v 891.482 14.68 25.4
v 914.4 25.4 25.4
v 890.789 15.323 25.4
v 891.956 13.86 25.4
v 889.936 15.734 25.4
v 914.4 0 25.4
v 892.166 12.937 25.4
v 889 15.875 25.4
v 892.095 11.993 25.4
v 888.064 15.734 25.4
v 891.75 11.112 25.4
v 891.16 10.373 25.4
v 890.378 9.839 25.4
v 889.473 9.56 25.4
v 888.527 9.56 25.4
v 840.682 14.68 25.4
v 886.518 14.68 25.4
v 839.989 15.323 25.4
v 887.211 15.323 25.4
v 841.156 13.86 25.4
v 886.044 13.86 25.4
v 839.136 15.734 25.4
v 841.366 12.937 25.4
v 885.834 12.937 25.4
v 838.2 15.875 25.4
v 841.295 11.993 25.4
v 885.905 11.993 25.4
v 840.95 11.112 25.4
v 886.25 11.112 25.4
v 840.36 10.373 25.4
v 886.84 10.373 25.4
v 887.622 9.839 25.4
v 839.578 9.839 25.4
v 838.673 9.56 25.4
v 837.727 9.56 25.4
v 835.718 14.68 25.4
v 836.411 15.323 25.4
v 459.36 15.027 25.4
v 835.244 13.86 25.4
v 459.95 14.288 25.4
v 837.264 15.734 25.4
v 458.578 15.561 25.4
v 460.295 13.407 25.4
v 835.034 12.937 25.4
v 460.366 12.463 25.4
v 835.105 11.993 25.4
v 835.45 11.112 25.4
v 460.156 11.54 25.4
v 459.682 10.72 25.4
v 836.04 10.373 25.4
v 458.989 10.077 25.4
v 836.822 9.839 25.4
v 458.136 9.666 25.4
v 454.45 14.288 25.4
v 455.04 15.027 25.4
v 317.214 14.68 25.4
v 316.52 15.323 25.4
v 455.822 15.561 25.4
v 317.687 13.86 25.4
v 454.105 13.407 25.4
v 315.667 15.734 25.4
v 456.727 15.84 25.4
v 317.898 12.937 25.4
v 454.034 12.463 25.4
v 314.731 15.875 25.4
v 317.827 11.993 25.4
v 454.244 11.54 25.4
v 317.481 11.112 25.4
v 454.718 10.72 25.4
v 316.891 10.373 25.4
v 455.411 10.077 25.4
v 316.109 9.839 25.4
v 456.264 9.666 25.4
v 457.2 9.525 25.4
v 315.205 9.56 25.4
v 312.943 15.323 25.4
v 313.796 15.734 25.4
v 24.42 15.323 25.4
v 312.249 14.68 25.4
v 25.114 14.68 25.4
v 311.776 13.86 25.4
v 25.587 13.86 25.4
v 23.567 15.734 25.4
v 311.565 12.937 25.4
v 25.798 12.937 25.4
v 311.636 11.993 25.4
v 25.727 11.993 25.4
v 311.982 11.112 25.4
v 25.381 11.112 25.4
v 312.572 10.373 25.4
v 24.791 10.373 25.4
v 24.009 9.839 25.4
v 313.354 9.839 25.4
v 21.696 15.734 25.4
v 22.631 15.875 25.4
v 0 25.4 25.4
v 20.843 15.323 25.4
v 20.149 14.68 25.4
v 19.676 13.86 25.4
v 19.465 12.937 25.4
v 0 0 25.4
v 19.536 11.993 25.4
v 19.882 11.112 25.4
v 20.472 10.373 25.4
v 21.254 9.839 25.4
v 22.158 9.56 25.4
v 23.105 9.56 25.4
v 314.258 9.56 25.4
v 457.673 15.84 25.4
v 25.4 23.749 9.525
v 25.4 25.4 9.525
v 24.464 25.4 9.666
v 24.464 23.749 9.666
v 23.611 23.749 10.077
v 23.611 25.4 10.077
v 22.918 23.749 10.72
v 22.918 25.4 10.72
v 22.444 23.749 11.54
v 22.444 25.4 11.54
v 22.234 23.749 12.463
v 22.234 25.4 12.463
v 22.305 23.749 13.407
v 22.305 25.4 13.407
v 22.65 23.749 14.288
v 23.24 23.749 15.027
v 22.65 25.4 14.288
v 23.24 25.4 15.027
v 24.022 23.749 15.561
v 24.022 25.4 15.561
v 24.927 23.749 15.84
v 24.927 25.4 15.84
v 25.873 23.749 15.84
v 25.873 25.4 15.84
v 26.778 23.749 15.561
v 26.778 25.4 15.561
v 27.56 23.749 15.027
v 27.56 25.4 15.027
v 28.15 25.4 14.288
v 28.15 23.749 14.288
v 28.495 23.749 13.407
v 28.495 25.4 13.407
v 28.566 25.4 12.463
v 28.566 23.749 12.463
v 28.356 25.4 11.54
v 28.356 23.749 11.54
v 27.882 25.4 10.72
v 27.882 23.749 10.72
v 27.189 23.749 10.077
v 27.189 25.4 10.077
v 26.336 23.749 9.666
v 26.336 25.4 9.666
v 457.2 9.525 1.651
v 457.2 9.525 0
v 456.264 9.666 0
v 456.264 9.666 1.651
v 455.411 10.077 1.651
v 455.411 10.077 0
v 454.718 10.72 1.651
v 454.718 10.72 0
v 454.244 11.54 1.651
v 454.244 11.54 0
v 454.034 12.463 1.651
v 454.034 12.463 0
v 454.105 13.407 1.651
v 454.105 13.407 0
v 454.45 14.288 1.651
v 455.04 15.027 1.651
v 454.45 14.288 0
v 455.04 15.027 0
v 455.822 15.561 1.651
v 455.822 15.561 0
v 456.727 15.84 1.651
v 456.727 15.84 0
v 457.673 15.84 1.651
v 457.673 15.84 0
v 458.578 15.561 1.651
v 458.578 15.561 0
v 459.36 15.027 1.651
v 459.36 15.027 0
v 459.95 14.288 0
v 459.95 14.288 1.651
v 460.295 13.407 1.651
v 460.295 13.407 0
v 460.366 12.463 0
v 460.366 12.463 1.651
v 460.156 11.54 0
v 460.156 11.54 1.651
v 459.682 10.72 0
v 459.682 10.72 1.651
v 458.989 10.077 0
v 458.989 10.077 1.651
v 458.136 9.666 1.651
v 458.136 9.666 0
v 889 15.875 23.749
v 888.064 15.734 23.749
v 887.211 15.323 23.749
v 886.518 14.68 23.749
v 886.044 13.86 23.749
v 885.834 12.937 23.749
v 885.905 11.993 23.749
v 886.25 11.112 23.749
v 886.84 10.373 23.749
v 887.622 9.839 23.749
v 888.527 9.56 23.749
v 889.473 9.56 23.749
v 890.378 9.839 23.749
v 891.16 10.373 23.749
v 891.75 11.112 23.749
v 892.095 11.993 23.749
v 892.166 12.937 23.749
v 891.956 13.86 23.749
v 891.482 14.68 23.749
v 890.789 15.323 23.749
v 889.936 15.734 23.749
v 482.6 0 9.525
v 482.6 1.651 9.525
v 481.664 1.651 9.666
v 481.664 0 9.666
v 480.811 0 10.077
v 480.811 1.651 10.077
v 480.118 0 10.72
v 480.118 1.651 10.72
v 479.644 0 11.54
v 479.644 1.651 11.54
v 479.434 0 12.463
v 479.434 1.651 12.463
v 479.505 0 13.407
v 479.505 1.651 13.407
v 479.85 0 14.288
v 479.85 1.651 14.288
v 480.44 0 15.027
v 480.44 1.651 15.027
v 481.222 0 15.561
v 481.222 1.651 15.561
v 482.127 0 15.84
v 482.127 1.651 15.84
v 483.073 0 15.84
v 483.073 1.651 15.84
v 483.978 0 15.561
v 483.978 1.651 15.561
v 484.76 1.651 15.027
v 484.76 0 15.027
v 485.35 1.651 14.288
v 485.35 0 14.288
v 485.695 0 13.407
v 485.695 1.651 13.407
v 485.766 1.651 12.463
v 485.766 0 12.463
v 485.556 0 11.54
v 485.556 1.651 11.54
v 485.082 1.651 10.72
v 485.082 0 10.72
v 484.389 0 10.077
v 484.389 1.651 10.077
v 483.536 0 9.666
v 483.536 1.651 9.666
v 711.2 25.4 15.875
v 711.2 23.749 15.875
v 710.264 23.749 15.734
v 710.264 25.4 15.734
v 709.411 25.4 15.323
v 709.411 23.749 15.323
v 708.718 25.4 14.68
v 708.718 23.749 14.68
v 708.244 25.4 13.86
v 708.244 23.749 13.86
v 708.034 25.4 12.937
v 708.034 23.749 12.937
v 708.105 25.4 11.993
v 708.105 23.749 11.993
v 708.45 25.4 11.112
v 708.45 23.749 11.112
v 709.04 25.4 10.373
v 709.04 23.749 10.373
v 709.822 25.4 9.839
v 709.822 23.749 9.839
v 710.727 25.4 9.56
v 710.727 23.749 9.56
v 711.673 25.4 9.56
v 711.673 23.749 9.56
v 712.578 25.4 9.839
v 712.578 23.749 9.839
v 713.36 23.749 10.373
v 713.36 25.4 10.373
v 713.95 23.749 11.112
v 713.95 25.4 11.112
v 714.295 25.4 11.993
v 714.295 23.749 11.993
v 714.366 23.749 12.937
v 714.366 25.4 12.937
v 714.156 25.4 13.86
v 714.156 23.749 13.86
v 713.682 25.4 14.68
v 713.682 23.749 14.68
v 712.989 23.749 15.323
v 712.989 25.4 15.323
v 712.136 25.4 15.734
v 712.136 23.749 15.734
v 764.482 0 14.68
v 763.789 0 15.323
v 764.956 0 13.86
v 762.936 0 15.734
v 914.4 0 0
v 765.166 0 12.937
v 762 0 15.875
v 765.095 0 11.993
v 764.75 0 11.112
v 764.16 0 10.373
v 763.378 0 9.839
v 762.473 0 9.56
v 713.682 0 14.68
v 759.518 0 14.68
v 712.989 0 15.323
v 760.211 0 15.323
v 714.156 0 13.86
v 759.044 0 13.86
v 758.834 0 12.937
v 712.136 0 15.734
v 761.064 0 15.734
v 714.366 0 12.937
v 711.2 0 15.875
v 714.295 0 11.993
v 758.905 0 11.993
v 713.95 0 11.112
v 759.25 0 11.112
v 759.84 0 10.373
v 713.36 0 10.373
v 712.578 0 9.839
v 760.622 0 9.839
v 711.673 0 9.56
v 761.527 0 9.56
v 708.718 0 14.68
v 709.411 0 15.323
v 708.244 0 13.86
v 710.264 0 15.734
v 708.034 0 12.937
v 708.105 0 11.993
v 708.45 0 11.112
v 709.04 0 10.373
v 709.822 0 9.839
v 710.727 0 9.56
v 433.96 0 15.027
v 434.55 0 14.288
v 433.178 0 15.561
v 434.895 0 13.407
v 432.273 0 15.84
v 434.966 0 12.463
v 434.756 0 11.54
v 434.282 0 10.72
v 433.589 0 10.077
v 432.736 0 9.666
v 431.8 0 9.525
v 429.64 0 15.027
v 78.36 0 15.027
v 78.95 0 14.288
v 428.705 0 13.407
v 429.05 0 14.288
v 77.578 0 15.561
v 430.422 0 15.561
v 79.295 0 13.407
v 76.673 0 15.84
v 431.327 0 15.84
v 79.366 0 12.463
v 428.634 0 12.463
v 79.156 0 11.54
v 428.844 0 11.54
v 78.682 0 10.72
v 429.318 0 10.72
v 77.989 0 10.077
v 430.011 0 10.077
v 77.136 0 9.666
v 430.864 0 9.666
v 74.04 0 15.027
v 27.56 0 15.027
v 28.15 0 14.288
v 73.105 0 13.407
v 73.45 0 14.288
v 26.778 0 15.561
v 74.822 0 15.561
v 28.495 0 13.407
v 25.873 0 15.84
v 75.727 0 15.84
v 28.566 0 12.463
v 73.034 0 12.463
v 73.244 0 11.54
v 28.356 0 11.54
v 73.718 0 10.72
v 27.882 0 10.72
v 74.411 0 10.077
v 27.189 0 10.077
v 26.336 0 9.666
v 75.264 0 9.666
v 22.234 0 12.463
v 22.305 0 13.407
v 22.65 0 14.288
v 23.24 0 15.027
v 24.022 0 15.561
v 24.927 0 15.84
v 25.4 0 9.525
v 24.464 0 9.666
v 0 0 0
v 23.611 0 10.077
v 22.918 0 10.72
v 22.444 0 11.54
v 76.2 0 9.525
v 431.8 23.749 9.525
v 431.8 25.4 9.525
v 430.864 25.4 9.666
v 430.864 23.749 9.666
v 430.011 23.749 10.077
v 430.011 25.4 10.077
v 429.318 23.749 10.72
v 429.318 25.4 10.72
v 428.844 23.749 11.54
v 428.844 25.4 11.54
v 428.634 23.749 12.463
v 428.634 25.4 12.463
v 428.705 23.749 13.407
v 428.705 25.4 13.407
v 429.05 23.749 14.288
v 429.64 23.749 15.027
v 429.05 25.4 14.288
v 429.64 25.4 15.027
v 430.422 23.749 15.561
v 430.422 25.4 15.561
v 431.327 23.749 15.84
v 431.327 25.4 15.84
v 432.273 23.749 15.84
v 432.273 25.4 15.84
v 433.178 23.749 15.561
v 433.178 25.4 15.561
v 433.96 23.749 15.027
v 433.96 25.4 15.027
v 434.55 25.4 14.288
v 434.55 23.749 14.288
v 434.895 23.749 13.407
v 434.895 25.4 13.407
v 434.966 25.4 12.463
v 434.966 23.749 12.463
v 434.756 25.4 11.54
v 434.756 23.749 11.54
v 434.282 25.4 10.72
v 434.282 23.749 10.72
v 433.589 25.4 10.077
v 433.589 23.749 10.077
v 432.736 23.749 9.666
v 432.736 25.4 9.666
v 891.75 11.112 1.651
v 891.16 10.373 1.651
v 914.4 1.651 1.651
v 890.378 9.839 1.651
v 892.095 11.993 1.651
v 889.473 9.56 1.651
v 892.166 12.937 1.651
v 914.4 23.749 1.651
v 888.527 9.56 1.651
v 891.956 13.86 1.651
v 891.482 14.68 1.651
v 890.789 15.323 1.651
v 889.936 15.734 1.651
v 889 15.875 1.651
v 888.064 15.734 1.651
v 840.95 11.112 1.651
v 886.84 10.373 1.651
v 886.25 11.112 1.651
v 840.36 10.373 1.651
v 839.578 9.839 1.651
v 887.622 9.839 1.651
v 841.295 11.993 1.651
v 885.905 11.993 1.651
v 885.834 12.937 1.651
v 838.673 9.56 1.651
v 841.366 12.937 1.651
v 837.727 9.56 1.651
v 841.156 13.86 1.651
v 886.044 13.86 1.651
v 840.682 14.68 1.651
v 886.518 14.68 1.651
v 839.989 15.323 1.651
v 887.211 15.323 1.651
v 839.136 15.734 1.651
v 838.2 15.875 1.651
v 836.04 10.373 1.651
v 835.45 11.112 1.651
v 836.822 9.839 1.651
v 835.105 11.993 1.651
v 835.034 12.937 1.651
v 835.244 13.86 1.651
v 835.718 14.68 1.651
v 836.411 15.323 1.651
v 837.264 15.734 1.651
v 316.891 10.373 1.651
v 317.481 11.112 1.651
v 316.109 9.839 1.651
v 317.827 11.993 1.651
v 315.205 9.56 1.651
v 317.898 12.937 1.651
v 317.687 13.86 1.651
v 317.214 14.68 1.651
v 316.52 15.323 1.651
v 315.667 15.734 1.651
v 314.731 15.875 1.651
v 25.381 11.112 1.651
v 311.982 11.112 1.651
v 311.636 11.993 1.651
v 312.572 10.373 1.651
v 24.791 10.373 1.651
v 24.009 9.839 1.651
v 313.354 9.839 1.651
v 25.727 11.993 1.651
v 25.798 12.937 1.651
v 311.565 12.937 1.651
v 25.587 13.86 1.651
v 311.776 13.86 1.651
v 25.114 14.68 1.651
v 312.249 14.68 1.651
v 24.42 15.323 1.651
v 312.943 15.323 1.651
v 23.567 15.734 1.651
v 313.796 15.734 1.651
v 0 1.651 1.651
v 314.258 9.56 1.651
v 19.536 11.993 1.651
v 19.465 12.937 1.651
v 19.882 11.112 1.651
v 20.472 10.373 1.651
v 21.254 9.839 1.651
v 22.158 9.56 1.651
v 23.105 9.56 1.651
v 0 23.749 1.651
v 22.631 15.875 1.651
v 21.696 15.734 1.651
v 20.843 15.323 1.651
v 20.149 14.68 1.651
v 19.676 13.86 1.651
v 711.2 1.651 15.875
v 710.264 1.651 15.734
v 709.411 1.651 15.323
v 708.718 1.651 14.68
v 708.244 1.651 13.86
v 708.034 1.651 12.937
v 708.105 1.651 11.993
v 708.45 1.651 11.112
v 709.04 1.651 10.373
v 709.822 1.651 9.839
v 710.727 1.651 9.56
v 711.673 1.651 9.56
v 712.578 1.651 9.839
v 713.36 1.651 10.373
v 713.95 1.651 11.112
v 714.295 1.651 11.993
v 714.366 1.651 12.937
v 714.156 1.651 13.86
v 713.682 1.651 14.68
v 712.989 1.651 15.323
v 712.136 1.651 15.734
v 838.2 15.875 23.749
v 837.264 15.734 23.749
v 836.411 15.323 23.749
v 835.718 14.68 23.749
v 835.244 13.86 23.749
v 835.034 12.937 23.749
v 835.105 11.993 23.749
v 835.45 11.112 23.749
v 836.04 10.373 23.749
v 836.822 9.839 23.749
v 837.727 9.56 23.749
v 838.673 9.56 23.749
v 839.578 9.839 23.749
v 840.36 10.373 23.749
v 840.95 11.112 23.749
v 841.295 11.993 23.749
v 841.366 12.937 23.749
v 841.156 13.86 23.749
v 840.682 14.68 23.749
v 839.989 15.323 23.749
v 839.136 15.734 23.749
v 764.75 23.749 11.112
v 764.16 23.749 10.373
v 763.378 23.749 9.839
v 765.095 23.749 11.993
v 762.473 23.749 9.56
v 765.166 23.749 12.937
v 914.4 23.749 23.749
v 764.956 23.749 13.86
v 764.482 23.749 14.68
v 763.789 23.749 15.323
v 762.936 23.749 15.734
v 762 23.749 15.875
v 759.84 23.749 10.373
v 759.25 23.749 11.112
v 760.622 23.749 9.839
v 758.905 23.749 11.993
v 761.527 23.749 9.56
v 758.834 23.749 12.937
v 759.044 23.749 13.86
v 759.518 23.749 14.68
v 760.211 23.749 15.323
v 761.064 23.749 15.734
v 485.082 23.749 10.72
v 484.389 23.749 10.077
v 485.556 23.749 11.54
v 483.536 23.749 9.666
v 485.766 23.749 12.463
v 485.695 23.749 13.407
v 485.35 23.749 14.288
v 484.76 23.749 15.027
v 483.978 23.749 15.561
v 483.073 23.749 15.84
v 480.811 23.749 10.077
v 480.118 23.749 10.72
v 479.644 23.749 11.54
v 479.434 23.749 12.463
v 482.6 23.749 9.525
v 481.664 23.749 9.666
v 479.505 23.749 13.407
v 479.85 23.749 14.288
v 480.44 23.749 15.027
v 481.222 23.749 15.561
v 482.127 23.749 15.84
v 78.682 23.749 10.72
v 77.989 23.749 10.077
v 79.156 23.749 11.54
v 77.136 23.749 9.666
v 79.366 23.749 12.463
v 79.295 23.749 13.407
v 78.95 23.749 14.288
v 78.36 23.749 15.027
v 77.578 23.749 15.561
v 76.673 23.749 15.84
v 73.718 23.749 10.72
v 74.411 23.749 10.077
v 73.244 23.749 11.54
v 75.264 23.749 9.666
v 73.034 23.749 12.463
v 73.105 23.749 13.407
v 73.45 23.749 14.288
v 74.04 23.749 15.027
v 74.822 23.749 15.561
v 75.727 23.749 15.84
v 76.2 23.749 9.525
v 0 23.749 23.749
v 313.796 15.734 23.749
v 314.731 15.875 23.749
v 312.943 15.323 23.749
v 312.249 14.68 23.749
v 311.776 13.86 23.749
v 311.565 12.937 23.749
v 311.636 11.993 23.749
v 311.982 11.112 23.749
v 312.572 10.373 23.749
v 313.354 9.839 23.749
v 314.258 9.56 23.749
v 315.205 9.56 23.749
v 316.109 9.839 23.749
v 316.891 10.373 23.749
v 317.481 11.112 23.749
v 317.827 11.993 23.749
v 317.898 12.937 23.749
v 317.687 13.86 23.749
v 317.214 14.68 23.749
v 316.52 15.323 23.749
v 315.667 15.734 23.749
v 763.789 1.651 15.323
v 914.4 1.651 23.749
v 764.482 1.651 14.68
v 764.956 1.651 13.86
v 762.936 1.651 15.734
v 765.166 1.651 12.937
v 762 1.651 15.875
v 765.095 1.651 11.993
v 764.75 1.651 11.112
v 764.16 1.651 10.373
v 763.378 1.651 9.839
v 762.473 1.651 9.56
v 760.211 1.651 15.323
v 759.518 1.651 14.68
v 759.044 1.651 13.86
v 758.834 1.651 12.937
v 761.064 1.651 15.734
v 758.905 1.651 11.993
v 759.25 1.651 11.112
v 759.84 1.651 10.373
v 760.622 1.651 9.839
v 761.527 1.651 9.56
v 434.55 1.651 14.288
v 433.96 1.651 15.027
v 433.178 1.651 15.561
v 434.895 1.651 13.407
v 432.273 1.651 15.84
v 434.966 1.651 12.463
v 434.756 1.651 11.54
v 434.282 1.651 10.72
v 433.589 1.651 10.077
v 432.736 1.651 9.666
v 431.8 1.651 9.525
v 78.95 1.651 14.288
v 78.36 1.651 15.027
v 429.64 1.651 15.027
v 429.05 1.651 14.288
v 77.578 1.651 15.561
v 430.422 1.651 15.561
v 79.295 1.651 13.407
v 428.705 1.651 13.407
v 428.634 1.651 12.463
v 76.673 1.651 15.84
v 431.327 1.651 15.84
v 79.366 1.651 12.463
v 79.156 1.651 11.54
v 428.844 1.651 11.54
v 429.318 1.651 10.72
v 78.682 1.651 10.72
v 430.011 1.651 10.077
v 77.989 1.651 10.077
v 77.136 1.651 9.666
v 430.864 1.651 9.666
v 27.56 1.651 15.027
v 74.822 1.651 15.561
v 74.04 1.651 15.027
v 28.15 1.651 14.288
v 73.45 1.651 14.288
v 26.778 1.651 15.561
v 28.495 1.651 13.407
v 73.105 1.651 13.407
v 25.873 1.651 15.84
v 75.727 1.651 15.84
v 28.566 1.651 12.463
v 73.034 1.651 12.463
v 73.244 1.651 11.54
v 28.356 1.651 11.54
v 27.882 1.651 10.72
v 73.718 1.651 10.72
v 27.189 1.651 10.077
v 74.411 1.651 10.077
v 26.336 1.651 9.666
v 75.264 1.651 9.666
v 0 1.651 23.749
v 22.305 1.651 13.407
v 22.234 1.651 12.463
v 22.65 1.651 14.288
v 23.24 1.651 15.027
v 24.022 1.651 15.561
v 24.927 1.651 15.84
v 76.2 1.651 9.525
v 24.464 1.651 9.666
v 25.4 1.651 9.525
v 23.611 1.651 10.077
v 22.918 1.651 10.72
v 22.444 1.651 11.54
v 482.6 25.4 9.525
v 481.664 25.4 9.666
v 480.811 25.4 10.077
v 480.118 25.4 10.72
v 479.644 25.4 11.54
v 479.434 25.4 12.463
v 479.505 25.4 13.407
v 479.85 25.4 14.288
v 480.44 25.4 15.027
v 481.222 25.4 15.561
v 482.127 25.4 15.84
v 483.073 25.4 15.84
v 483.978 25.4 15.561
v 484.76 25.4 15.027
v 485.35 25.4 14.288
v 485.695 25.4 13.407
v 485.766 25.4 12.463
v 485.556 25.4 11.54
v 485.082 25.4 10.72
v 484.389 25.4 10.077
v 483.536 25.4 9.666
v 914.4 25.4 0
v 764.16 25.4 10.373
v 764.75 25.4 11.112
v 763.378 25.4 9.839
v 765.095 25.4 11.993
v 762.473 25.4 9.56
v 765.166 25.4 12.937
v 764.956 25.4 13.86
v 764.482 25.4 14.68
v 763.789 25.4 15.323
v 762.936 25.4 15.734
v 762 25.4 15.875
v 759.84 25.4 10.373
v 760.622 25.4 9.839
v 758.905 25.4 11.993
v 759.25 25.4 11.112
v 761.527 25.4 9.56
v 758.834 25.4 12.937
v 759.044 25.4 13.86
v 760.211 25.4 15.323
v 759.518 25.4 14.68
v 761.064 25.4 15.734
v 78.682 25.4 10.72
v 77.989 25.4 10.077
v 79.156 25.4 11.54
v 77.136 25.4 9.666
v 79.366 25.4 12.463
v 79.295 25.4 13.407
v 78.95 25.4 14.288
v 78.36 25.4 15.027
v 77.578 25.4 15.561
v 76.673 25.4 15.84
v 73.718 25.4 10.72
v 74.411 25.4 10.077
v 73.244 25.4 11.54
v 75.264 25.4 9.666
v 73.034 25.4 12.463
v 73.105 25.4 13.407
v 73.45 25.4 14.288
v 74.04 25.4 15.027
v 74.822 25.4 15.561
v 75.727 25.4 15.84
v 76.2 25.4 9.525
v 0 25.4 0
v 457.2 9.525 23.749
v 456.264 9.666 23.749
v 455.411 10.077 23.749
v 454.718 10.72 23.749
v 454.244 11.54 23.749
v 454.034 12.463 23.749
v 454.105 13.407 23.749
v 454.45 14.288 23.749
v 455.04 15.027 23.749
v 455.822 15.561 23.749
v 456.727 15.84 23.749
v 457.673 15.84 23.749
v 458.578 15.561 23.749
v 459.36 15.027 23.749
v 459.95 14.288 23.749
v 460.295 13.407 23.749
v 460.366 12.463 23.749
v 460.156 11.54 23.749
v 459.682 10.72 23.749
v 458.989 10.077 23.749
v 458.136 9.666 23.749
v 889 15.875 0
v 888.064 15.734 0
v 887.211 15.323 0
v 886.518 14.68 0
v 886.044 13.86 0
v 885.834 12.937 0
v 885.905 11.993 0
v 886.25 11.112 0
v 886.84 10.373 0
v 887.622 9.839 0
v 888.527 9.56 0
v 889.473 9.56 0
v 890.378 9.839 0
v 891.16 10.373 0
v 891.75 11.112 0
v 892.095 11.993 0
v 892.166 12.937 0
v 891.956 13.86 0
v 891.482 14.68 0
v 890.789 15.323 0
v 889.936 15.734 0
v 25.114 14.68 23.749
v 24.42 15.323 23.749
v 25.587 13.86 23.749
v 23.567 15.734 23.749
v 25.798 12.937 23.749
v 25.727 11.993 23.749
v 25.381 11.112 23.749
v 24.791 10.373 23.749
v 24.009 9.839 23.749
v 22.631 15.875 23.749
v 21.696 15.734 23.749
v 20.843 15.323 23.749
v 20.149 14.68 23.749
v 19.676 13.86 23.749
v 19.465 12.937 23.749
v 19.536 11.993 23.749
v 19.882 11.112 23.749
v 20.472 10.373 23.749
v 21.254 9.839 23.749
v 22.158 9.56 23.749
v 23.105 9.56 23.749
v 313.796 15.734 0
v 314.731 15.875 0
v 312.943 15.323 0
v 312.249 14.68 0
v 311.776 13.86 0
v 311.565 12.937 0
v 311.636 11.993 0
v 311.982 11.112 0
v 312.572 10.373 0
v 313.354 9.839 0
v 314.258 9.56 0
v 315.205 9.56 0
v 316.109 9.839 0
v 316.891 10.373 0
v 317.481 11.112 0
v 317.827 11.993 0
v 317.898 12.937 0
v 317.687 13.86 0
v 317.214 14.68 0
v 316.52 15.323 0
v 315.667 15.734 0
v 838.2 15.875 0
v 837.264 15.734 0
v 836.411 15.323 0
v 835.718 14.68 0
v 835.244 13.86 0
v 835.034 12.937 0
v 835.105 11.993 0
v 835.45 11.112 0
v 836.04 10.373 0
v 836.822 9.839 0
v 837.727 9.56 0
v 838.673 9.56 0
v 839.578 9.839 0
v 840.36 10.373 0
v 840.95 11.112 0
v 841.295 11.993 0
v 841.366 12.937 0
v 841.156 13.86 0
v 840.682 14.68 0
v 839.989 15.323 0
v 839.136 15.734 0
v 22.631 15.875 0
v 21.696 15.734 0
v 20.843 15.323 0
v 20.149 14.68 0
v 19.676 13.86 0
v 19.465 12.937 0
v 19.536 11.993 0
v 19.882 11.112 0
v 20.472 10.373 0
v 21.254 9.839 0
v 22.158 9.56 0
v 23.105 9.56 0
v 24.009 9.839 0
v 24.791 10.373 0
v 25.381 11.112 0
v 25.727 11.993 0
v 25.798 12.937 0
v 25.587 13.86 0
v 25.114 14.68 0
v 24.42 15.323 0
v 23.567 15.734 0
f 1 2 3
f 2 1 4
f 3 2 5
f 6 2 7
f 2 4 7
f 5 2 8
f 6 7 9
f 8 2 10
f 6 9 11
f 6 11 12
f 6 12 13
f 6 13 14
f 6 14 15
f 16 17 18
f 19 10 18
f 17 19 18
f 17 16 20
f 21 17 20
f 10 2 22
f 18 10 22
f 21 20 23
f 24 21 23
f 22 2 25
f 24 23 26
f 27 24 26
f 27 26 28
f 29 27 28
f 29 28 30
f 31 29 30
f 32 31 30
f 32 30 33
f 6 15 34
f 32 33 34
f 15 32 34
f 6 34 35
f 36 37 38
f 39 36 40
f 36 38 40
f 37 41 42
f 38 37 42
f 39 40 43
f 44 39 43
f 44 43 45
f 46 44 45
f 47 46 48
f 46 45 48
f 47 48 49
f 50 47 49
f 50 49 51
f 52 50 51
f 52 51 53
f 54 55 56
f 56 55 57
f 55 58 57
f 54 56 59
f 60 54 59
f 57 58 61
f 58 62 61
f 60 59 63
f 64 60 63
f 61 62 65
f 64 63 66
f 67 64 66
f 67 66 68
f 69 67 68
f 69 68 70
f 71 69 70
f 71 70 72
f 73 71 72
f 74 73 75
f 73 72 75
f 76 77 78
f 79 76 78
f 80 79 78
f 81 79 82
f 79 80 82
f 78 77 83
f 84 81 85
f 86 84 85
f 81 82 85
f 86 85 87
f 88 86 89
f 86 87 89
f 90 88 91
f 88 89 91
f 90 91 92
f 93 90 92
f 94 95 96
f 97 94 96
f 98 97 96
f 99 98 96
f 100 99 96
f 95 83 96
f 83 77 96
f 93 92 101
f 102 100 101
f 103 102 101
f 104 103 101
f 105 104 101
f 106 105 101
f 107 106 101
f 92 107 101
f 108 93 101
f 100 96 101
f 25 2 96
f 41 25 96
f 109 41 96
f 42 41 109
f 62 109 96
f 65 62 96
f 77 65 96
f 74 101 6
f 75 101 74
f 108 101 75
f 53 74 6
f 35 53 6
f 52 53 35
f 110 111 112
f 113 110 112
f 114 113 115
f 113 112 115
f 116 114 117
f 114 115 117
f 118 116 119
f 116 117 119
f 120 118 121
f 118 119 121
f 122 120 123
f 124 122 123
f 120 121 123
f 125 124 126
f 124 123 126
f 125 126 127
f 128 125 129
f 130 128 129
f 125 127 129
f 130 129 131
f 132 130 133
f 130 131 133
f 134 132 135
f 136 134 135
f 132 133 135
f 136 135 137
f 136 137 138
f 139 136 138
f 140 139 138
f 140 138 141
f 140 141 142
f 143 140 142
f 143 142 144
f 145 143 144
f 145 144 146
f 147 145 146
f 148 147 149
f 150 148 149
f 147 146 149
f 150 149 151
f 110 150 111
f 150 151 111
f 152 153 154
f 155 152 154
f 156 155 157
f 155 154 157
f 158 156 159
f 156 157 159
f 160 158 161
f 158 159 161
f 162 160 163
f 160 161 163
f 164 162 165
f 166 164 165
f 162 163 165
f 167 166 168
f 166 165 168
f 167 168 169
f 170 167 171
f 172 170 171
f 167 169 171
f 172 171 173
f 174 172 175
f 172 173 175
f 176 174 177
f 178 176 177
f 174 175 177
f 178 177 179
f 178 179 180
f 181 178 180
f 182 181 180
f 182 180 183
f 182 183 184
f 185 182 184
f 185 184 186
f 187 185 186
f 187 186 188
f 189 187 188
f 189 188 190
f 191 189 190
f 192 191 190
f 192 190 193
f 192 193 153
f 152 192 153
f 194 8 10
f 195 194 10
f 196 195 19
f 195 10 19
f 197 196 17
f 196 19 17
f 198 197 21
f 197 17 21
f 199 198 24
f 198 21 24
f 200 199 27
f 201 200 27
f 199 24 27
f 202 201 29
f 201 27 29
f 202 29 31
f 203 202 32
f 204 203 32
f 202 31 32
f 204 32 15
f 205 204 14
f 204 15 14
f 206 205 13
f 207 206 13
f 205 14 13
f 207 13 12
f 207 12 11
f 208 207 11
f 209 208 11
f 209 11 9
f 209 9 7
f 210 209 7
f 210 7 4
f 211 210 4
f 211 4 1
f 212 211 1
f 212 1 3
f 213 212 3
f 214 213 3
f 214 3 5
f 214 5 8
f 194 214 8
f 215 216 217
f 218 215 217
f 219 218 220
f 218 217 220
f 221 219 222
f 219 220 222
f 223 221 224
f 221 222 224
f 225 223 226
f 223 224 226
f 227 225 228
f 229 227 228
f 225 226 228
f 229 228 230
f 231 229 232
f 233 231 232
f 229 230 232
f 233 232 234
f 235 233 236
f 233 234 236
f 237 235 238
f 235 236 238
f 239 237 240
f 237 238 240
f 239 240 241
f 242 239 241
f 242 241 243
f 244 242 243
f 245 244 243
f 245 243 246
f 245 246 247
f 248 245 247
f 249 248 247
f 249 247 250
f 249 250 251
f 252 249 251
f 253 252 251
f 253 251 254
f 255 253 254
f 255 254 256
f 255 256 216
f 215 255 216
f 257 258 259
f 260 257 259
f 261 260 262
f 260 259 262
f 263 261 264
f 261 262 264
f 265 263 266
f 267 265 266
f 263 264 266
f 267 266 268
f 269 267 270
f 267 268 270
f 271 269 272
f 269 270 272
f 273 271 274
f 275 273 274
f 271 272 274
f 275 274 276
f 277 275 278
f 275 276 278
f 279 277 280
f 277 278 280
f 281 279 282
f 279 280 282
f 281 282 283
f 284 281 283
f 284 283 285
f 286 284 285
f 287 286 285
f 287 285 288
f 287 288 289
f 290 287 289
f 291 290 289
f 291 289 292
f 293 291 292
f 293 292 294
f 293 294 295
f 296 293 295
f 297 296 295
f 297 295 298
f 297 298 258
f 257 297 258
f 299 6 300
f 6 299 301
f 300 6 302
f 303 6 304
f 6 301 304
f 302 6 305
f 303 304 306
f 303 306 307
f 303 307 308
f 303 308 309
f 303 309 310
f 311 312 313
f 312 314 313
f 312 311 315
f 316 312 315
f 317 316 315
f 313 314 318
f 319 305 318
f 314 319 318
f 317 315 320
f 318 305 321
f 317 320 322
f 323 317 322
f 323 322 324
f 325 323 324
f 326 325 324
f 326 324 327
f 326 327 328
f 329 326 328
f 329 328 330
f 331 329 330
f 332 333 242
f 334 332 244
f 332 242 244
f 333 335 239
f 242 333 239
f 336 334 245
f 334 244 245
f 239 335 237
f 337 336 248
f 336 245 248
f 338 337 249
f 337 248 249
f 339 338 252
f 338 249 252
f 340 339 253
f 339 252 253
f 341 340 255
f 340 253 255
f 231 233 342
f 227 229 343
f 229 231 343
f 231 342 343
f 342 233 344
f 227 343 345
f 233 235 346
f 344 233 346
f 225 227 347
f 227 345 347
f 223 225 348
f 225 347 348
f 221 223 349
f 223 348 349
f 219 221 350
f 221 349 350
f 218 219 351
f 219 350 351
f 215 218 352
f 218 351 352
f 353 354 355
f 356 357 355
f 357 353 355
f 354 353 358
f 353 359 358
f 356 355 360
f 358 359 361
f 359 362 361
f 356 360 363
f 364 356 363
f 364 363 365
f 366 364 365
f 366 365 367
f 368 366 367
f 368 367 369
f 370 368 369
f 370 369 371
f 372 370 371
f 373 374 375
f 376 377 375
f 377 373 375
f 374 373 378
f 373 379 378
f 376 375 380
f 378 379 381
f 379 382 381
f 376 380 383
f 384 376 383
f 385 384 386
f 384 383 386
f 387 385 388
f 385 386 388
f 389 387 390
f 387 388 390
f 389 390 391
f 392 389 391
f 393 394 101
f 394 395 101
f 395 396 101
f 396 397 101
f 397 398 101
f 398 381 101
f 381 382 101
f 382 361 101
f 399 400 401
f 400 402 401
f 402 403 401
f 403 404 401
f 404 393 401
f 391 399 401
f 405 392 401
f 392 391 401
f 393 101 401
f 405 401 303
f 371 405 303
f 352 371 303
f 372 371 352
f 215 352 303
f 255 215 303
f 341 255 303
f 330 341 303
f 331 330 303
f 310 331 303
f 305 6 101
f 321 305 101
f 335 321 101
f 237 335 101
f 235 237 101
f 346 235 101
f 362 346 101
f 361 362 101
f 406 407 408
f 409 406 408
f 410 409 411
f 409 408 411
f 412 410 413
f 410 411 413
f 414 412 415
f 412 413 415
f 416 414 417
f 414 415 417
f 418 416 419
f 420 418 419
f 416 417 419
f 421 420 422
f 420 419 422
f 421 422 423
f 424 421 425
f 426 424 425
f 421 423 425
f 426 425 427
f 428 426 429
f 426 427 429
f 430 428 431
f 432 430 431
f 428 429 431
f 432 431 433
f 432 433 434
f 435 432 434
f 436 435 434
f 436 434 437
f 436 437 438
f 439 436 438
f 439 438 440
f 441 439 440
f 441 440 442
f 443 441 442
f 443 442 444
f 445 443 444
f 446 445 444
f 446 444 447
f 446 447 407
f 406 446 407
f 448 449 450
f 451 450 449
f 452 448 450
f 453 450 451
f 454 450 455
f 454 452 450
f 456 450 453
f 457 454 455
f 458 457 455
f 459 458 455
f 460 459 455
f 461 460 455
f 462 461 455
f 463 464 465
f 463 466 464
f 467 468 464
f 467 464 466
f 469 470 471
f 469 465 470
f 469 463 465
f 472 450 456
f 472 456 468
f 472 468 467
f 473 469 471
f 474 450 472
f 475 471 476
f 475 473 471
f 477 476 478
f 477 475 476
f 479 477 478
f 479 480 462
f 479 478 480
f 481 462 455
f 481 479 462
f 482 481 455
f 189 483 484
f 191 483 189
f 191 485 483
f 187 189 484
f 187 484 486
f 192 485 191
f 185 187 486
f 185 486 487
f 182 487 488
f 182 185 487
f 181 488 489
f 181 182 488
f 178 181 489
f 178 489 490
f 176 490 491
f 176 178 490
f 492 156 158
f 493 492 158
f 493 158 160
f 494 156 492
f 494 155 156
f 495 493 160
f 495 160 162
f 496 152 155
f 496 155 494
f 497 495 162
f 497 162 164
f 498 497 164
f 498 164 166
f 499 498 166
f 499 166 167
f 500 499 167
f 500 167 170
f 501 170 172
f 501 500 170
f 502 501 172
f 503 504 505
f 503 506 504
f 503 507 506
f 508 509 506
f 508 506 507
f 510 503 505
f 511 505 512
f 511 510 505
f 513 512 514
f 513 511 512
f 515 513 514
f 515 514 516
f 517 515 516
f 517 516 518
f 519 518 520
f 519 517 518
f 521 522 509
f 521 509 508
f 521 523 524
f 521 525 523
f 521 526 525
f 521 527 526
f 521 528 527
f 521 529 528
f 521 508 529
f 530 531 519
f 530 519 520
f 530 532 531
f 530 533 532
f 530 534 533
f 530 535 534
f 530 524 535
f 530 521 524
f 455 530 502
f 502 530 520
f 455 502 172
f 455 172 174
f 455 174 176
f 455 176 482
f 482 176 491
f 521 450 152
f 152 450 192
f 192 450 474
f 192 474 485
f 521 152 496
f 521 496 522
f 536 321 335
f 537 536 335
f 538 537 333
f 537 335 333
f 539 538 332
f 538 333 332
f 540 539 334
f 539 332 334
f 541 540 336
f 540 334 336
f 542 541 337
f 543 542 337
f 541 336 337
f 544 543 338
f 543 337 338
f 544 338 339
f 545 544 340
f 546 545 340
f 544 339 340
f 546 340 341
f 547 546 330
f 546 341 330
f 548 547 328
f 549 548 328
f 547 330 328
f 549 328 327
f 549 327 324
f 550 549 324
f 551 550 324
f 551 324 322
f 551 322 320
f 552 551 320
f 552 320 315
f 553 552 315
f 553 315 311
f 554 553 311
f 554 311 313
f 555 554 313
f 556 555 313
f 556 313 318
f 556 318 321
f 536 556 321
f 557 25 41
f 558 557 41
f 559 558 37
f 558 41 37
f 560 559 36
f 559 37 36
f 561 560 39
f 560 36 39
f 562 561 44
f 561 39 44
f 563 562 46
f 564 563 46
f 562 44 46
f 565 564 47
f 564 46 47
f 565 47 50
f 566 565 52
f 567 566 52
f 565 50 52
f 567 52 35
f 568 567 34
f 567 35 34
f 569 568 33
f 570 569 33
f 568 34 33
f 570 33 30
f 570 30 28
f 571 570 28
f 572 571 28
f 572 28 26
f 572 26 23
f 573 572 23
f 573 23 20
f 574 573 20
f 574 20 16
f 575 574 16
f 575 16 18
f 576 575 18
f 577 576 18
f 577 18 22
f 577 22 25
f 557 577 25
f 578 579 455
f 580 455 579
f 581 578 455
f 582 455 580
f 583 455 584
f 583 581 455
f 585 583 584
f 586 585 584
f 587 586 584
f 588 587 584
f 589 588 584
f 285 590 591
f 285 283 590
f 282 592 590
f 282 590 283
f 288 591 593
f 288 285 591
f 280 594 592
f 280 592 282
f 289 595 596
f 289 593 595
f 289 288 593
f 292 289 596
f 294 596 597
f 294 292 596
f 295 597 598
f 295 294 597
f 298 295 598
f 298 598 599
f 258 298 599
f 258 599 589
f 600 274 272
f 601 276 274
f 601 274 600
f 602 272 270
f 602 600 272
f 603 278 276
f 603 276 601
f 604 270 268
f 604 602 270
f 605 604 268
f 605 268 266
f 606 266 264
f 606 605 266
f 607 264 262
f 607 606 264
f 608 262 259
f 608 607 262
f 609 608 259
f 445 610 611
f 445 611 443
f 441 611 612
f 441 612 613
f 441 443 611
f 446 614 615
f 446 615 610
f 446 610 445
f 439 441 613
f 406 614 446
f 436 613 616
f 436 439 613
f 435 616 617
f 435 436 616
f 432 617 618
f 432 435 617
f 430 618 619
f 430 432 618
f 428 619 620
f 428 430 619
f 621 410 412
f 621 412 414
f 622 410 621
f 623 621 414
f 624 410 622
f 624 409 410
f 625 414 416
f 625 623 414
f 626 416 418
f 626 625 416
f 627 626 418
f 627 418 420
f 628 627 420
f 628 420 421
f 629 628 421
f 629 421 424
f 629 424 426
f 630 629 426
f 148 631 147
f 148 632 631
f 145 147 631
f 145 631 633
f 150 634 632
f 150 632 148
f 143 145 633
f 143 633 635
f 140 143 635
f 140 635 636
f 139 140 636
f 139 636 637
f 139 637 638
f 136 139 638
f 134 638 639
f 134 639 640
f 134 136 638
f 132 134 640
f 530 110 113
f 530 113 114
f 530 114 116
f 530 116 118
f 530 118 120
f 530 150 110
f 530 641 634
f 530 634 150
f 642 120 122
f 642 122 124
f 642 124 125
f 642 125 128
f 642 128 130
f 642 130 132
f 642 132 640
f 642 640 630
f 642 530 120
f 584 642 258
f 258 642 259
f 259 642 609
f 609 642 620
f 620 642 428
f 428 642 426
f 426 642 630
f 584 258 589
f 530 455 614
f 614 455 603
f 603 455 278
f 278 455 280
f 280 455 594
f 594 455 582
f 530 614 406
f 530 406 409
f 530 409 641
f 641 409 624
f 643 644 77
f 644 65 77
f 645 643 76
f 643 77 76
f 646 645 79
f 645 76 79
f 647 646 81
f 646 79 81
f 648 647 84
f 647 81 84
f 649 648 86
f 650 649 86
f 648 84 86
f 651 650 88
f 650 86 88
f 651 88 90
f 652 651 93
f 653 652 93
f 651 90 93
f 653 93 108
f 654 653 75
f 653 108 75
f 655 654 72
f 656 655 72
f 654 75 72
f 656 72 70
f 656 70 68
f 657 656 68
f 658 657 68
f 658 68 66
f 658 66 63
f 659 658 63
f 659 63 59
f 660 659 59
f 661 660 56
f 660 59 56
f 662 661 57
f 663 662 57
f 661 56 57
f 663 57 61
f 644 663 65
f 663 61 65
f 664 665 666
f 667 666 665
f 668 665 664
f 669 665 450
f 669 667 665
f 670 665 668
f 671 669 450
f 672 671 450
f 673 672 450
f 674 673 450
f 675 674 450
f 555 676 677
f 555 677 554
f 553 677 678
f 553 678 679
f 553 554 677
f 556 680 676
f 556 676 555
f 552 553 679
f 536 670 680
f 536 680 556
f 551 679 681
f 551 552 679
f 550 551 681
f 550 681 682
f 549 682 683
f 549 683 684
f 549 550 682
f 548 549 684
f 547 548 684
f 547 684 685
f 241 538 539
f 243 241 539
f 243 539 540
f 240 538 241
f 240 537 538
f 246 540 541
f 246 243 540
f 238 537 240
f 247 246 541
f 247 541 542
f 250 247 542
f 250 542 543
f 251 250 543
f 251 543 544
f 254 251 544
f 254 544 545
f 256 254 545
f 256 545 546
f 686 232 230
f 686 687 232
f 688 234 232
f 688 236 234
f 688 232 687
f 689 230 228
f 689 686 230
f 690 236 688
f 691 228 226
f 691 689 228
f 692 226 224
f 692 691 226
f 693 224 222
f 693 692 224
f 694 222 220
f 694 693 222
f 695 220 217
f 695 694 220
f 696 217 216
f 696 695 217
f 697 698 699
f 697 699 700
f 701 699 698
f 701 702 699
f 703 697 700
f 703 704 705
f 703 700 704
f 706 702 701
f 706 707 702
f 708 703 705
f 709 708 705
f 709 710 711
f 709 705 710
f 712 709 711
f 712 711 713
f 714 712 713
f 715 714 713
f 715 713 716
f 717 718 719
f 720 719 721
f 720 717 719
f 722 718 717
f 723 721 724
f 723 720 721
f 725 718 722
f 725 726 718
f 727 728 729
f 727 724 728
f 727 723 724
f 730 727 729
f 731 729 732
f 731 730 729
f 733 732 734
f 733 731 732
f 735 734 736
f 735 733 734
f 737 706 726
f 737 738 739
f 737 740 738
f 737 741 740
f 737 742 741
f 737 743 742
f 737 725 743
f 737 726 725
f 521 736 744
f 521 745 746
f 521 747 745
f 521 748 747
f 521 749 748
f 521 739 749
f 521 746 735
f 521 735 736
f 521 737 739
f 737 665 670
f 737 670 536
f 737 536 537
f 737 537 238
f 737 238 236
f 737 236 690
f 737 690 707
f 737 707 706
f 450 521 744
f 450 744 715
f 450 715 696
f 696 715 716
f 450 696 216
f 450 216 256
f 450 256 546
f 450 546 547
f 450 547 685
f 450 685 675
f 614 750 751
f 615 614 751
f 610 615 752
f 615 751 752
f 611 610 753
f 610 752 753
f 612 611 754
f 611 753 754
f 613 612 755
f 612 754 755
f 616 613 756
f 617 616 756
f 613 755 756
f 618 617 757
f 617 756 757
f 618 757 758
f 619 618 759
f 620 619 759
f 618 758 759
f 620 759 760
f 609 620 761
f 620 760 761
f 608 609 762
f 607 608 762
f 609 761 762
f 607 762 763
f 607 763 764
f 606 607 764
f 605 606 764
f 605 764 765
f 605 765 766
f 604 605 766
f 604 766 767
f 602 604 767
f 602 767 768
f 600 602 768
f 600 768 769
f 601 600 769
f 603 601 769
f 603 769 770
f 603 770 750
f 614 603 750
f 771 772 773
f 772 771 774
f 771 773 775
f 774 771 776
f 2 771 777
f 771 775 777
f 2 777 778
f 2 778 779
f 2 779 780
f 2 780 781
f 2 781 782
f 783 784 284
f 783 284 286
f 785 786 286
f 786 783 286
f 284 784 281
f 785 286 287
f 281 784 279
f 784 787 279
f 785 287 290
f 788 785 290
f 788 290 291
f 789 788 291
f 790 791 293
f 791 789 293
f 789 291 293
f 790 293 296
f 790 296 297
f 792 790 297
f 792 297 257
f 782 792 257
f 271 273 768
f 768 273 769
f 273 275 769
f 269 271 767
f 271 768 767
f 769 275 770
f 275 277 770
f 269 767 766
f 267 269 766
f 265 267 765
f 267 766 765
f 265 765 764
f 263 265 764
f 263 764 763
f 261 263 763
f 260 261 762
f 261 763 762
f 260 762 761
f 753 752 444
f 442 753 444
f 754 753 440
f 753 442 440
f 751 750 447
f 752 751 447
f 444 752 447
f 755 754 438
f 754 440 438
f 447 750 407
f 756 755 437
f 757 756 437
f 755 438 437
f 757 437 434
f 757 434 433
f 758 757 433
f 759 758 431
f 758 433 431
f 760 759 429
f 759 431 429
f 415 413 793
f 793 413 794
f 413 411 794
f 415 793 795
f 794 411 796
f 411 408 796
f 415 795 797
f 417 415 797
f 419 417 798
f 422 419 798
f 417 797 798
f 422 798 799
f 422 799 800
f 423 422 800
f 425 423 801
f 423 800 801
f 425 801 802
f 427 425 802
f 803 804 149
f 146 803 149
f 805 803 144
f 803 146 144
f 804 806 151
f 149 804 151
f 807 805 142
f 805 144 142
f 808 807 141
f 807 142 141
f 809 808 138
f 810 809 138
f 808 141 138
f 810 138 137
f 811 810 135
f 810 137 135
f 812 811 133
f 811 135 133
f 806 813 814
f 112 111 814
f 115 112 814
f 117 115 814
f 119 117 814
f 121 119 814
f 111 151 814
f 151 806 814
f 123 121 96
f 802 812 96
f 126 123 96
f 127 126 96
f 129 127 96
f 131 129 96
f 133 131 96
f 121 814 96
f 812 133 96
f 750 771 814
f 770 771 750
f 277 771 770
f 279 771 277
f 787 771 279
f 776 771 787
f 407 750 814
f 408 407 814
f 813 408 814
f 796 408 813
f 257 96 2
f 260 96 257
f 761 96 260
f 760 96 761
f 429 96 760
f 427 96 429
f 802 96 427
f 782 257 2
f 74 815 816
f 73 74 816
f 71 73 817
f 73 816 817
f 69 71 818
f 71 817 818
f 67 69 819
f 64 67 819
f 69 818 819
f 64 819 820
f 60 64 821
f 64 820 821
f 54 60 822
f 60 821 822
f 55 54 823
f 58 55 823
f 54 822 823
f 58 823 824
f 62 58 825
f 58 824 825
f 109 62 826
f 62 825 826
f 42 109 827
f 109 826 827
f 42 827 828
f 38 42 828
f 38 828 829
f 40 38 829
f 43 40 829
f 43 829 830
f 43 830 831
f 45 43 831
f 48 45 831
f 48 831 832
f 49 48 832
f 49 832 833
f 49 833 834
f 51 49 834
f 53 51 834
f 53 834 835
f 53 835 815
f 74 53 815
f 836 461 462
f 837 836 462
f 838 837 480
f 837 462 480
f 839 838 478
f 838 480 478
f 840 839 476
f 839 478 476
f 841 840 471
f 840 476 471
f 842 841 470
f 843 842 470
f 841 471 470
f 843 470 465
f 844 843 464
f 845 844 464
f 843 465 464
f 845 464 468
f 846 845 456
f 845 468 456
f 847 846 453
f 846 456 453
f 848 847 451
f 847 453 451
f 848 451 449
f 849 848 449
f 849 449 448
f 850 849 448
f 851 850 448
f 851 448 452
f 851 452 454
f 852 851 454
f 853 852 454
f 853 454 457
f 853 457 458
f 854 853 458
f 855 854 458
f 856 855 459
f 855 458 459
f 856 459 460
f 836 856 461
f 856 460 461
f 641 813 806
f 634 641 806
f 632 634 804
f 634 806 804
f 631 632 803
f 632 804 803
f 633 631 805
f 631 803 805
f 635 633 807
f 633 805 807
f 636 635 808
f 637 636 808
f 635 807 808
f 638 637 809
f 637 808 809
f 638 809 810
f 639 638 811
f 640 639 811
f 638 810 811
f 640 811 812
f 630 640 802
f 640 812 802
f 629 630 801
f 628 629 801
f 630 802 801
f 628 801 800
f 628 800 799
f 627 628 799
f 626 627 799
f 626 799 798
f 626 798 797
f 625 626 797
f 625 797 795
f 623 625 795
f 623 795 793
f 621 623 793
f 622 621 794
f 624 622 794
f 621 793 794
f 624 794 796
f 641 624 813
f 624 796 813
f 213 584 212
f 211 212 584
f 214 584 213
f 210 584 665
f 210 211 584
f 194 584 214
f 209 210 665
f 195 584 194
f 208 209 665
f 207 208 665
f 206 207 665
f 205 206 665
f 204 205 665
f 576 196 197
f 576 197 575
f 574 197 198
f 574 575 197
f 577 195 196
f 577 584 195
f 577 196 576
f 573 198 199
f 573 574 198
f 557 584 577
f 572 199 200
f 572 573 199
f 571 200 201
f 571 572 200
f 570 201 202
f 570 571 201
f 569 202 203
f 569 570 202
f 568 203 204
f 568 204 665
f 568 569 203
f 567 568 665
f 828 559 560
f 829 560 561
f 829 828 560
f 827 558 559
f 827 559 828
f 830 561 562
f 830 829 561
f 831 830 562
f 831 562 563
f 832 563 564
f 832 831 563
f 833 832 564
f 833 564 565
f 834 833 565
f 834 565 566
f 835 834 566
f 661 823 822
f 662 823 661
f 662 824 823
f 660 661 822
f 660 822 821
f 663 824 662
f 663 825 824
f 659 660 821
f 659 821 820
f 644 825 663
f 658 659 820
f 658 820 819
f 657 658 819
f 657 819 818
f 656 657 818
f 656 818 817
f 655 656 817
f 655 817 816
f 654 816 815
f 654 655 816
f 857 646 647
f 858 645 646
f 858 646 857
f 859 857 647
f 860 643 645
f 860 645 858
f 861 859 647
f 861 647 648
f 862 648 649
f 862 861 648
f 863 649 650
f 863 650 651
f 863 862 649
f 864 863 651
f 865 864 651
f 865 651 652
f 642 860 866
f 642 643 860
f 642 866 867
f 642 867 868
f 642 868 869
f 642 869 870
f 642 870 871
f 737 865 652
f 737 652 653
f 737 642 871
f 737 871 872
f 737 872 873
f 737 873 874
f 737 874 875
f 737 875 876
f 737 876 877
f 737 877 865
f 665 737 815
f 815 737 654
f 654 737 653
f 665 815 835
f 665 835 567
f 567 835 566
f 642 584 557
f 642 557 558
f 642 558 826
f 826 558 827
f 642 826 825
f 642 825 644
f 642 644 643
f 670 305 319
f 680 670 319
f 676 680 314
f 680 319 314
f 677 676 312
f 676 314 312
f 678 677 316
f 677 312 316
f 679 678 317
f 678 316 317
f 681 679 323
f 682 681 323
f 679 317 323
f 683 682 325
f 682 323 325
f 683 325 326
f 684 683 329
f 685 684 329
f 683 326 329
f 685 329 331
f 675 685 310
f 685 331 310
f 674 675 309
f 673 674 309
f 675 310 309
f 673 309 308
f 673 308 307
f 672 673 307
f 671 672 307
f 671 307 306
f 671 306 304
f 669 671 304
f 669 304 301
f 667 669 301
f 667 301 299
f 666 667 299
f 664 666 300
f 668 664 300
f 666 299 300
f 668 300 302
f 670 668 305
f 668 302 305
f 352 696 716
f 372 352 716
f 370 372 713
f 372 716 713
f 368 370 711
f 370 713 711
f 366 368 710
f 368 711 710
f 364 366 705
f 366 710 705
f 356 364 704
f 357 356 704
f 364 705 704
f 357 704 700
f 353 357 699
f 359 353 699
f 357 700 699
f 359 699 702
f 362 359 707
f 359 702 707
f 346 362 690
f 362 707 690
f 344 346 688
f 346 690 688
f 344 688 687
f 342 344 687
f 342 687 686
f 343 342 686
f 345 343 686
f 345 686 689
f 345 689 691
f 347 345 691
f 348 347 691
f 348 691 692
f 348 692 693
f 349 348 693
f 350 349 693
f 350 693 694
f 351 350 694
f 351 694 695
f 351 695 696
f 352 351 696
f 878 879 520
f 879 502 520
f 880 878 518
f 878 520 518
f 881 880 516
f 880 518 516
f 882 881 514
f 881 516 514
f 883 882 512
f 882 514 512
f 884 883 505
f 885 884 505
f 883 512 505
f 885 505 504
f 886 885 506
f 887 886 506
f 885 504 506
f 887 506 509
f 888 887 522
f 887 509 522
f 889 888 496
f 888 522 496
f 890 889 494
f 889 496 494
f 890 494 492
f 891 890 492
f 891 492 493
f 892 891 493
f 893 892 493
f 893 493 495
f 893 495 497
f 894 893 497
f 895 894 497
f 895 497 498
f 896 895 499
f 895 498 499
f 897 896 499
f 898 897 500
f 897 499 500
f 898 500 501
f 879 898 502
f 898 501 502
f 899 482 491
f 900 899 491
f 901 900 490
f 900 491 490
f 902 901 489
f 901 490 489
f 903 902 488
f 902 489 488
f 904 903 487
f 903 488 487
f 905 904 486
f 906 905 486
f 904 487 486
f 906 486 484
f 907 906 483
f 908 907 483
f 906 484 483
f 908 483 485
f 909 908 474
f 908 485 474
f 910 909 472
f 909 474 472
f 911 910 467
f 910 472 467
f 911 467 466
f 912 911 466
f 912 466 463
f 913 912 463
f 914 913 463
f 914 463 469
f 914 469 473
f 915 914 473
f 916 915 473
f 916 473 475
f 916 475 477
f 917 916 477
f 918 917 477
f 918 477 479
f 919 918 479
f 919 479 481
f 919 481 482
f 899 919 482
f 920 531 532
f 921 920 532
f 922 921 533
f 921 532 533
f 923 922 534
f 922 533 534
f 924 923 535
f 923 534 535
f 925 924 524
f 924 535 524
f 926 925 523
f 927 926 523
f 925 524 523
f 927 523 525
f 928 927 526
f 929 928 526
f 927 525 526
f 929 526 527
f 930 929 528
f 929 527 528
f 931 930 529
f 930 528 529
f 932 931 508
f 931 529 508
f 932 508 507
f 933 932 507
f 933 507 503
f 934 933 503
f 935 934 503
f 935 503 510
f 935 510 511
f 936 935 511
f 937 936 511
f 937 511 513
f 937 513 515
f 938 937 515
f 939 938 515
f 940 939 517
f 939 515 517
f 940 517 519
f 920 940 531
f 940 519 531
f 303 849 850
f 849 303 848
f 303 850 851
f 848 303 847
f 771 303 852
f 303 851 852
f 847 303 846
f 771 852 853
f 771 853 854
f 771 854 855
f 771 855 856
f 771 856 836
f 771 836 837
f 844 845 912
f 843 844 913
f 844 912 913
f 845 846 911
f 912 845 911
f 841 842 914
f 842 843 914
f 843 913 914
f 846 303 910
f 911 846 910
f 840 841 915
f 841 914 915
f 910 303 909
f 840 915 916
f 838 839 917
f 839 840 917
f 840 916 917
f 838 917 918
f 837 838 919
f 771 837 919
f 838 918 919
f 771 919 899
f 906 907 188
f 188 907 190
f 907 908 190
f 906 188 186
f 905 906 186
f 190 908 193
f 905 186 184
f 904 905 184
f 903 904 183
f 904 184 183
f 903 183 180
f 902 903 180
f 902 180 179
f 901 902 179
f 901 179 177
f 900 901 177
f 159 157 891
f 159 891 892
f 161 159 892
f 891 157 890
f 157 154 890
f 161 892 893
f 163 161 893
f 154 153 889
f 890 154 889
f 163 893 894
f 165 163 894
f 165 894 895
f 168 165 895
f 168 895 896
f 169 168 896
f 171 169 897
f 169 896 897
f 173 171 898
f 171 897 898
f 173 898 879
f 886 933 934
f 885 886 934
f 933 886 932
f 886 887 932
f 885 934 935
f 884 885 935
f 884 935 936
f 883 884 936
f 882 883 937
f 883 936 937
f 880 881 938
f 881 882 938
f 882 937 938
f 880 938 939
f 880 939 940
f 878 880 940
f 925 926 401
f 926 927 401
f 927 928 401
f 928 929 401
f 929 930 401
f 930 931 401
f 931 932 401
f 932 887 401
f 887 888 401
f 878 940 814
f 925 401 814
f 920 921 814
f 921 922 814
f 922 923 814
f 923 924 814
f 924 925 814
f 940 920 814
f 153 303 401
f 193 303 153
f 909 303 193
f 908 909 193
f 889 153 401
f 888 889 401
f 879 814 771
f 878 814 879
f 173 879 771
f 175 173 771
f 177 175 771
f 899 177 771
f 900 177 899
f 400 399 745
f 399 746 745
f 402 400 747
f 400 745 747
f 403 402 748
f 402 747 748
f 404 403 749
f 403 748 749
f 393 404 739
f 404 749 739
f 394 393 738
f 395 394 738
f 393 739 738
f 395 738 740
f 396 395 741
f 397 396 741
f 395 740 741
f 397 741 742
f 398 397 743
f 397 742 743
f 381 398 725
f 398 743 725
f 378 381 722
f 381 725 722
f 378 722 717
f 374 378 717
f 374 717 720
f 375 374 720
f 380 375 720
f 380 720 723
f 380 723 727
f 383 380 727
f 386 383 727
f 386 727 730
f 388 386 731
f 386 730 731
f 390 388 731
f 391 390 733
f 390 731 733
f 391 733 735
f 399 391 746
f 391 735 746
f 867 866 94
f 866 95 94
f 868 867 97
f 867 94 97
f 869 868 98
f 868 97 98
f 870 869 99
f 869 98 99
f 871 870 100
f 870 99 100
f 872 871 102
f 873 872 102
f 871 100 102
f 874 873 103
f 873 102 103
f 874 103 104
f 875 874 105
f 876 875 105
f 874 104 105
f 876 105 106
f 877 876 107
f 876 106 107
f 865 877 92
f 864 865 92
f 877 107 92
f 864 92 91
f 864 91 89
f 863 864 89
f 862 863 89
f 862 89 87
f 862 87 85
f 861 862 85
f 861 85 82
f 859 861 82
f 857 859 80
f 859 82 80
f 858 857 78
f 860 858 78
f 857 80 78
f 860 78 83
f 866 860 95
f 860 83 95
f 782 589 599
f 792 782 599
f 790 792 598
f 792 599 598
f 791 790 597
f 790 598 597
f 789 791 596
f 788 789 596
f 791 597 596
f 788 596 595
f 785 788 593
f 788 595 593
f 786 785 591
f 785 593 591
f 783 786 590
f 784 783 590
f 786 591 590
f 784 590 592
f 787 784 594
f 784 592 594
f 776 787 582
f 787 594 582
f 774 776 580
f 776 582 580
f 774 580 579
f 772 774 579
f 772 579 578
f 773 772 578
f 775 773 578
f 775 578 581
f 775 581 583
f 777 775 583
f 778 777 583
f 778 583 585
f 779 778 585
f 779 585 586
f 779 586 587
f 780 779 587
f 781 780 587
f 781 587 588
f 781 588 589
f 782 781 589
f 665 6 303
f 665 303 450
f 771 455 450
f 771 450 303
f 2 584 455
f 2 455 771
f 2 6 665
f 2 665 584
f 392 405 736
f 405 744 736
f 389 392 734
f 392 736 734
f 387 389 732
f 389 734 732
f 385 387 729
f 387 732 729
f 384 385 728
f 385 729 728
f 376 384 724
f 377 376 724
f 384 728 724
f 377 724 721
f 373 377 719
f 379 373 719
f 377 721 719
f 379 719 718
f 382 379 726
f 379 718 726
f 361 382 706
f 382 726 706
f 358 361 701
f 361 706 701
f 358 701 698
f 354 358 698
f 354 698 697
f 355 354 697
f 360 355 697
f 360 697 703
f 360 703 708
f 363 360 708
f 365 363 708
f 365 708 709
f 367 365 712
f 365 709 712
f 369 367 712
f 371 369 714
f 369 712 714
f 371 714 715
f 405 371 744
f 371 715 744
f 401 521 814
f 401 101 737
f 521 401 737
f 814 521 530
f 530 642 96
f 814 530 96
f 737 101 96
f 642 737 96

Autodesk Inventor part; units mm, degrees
ref_plane "YZ Plane" through (0, 0, 0) normal (1, 0, 0) x (0, 1, 0)
ref_plane "XZ Plane" through (0, 0, 0) normal (0, 1, 0) x (-1, 0, 0)
ref_plane "XY Plane" through (0, 0, 0) normal (0, 0, 1) x (1, 0, 0)
sketch "Sketch1" plane through (0, 0, 0) normal (1, 0, 0) x (0, 1, 0)
  line L0 (0, 0) -> (25.4, 0)
  line L1 (25.4, 0) -> (25.4, 25.4)
  line L2 (25.4, 25.4) -> (0, 25.4)
  line L3 (0, 25.4) -> (0, 0)
  line L4 (1.651, 1.651) -> (23.749, 1.651)
  line L5 (23.749, 1.651) -> (23.749, 23.749)
  line L6 (23.749, 23.749) -> (1.651, 23.749)
  line L7 (1.651, 23.749) -> (1.651, 1.651)
  dimension "d0" = 25.4
  dimension "d2" = 25.4
  dimension "d3" = 1.651
  dimension "d4" = 1.651
  dimension "d5" = 1.651
  dimension "d6" = 1.651
extrude "Extrusion1" add sketch "Sketch1" along normal blind 914.4
sketch "Sketch3" plane through (0, 0, 0) normal (0, 0, -1) x (-1, 0, 0)
  line L0 (0, 25.4) -> (-914.4, 25.4) projected
  line L1 (-914.4, 0) -> (-914.4, 25.4) projected
  line L2 (0, 0) -> (-914.4, 0) projected
  point P0 (-889, 12.7)
  point P1 (-838.2, 12.7)
  dimension "d9" = 12.7
  dimension "d10" = 25.4
  dimension "d11" = 12.7
  dimension "d12" = 50.8
hole "Hole1" at (889, 12.7, 0) at (838.2, 12.7, 0) direction (0, 0, 1) diameter 6.35 end through all
sketch "Sketch4" plane through (0, 25.4, 25.4) normal (0, 1, 0) x (1, 0, 0)
  line L0 (0, 0) -> (914.4, 0) projected
  line L1 (914.4, 25.4) -> (914.4, 0) projected
  line L2 (0, 25.4) -> (914.4, 25.4) projected
  line L3 (736.6, 25.4) -> (736.6, 0)
  point P0 (711.2, 12.7)
  point P1 (762, 12.7)
  dimension "d21" = 50.8
  dimension "d23" = 12.7
  dimension "d24" = 12.7
  dimension "d25" = 177.8
  dimension "d26" = 25.4
hole "Hole2" at (711.2, 25.4, 12.7) at (762, 25.4, 12.7) direction (0, -1, 0) diameter 6.35 end through all
sketch "Sketch5" plane through (0, 0, 0) normal (0, 0, -1) x (-1, 0, 0)
  line L0 (0, 0) -> (0, 25.4) projected
  line L1 (0, 0) -> (-914.4, 0) projected
  point P0 (-314.7314, 12.7)
  point P1 (-22.6314, 12.7)
  dimension "d34" = 12.7
  dimension "d35" = 292.1
  dimension "d36" = 22.6314
hole "Hole3" at (314.7314, 12.7, 0) at (22.6314, 12.7, 0) direction (0, 0, 1) diameter 6.35 end through all
sketch "Sketch6" plane through (0, 0, 0) normal (0, -1, 0) x (1, 0, 0)
  line L0 (0, 0) -> (914.4, 0) projected
  line L1 (914.4, 25.4) -> (914.4, 0) projected
  line L2 (0, 25.4) -> (914.4, 25.4) projected
  point P0 (431.8, 12.7)
  point P1 (482.6, 12.7)
  dimension "d44" = 50.8
  dimension "d46" = 12.7
  dimension "d47" = 12.7
  dimension "d48" = 431.8
hole "Hole4" at (431.8, 0, 12.7) at (482.6, 0, 12.7) direction (0, 1, 0) diameter 6.35 end through all
sketch "Sketch7" plane through (0, 0, 25.4) normal (0, 0, 1) x (1, 0, 0)
  line L0 (914.4, 25.4) -> (914.4, 0) projected
  line L1 (0, 25.4) -> (914.4, 25.4) projected
  point P0 (457.2, 12.7)
  dimension "d56" = 12.7
  dimension "d57" = 457.2
hole "Hole5" at (457.2, 12.7, 25.4) direction (0, 0, -1) diameter 6.35 end through all
sketch "Sketch8" plane through (0, 0, 0) normal (0, -1, 0) x (1, 0, 0)
  line L0 (0, 25.4) -> (0, 0) projected
  point P0 (25.4, 12.7)
  point P1 (76.2, 12.7)
  dimension "d65" = 25.4
  dimension "d66" = 50.8
hole "Hole6" at (25.4, 0, 12.7) at (76.2, 0, 12.7) direction (0, 1, 0) diameter 6.35 end through all
properties part number "Bottom_Bar" material "Aluminum 6061"
